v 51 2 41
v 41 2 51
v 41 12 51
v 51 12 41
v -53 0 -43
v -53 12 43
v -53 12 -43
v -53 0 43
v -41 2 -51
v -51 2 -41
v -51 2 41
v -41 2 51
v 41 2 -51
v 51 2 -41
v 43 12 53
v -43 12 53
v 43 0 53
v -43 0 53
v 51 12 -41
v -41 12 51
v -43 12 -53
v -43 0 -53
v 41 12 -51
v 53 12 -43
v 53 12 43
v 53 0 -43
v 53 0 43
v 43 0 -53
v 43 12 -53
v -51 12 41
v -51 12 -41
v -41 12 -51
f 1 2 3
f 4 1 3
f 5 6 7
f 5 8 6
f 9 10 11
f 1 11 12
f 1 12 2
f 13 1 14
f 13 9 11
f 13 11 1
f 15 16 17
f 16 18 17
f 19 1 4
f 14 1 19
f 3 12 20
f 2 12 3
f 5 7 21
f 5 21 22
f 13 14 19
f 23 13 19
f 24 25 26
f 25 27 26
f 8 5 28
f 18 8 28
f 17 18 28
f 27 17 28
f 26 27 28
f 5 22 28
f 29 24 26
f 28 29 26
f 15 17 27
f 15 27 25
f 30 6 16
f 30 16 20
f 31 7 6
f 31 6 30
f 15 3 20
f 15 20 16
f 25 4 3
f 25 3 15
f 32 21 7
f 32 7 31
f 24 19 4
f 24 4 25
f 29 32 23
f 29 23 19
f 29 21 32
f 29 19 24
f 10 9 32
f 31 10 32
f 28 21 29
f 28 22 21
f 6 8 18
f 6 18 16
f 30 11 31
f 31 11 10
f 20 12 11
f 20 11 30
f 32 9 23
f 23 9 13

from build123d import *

# Parameters (mm, degrees)
SKETCH1_W           = 106
SKETCH1_H           = 106
BOSS_EXTRUDE1_DEPTH = 2
SKETCH2_W           = 106
SKETCH2_H           = 106
SKETCH2_W_2         = 102
SKETCH2_H_2         = 102
BOSS_EXTRUDE2_DEPTH = 10
CHAMFER1_SIZE       = 10


with BuildPart() as part:
    # Sketch1 → Boss-Extrude1 (new body)
    with BuildSketch(Plane(origin=(0, 0, 0), x_dir=(1, 0, 0), z_dir=(0, 1, 0))):
        Rectangle(SKETCH1_W, SKETCH1_H)
    extrude(amount=BOSS_EXTRUDE1_DEPTH)

    # Sketch2 → Boss-Extrude2 (add)
    with BuildSketch(Plane(origin=(0, 2, 0), x_dir=(1, 0, 0), z_dir=(0, 1, 0))):
        Rectangle(SKETCH2_W, SKETCH2_H)
        Rectangle(SKETCH2_W_2, SKETCH2_H_2, mode=Mode.SUBTRACT)
    extrude(amount=BOSS_EXTRUDE2_DEPTH)

    # Chamfer1
    chamfer1_edges = [part.edges().sort_by_distance(p)[0] for p in [
        (-51, 7, -51),
        (-51, 7, 51),
        (51, 7, 51),
        (51, 7, -51),
        (-53, 6, -53),
        (53, 6, -53),
        (53, 6, 53),
        (-53, 6, 53),
    ]]
    chamfer(chamfer1_edges, length=CHAMFER1_SIZE)


solid = part.part
